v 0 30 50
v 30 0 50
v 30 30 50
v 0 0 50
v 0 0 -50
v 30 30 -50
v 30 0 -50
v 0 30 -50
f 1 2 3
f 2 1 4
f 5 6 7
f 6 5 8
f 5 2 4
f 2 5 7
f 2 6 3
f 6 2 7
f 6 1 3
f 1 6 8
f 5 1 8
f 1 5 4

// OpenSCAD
$fn=64;

module extrusion_30x30(length=100, size=30) {
    translate([0,0,-length/2])
        cube([size, size, length], center=false);
}

extrusion_30x30(100, 30);
